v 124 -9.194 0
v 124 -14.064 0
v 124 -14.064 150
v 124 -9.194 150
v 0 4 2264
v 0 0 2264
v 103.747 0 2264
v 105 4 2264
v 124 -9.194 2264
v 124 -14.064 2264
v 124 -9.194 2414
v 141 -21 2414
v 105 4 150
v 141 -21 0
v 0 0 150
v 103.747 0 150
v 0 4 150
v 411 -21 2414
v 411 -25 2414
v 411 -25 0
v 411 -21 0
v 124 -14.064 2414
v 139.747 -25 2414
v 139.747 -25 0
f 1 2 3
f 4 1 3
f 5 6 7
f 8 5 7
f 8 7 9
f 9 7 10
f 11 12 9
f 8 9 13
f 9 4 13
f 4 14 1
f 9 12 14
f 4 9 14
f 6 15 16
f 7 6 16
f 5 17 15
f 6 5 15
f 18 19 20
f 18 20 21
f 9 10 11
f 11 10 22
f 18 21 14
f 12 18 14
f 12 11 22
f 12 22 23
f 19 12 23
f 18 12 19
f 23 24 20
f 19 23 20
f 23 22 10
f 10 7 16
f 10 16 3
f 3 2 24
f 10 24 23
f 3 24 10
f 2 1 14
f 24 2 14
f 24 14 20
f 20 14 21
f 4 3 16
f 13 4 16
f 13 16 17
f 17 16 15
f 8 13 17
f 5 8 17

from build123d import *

# Parameters (mm, degrees)
F1_DEPTH = 2414
F3_DEPTH = 29.001


with BuildPart() as f1:
    # F0 (on Top) → F1 (new body)
    with BuildSketch(Plane.XY):
        Polygon((0, 4), (0, 0), (103.747326, 0), (139.747326, -25), (411, -25), (411, -21), (141, -21), (105, 4), align=None)
    extrude(amount=F1_DEPTH)

    # F2 (on face) → F3 (cut, through all)
    with BuildSketch(Plane.XZ.offset(25)):
        Polygon((103.747326, 2414), (0, 2414), (0, 2264), (124, 2264), (124, 2414), align=None)
        Polygon((103.747326, 0), (124, 0), (124, 150), (0, 150), (0, 0), align=None)
    extrude(amount=-F3_DEPTH, mode=Mode.SUBTRACT)


solid = f1.part
